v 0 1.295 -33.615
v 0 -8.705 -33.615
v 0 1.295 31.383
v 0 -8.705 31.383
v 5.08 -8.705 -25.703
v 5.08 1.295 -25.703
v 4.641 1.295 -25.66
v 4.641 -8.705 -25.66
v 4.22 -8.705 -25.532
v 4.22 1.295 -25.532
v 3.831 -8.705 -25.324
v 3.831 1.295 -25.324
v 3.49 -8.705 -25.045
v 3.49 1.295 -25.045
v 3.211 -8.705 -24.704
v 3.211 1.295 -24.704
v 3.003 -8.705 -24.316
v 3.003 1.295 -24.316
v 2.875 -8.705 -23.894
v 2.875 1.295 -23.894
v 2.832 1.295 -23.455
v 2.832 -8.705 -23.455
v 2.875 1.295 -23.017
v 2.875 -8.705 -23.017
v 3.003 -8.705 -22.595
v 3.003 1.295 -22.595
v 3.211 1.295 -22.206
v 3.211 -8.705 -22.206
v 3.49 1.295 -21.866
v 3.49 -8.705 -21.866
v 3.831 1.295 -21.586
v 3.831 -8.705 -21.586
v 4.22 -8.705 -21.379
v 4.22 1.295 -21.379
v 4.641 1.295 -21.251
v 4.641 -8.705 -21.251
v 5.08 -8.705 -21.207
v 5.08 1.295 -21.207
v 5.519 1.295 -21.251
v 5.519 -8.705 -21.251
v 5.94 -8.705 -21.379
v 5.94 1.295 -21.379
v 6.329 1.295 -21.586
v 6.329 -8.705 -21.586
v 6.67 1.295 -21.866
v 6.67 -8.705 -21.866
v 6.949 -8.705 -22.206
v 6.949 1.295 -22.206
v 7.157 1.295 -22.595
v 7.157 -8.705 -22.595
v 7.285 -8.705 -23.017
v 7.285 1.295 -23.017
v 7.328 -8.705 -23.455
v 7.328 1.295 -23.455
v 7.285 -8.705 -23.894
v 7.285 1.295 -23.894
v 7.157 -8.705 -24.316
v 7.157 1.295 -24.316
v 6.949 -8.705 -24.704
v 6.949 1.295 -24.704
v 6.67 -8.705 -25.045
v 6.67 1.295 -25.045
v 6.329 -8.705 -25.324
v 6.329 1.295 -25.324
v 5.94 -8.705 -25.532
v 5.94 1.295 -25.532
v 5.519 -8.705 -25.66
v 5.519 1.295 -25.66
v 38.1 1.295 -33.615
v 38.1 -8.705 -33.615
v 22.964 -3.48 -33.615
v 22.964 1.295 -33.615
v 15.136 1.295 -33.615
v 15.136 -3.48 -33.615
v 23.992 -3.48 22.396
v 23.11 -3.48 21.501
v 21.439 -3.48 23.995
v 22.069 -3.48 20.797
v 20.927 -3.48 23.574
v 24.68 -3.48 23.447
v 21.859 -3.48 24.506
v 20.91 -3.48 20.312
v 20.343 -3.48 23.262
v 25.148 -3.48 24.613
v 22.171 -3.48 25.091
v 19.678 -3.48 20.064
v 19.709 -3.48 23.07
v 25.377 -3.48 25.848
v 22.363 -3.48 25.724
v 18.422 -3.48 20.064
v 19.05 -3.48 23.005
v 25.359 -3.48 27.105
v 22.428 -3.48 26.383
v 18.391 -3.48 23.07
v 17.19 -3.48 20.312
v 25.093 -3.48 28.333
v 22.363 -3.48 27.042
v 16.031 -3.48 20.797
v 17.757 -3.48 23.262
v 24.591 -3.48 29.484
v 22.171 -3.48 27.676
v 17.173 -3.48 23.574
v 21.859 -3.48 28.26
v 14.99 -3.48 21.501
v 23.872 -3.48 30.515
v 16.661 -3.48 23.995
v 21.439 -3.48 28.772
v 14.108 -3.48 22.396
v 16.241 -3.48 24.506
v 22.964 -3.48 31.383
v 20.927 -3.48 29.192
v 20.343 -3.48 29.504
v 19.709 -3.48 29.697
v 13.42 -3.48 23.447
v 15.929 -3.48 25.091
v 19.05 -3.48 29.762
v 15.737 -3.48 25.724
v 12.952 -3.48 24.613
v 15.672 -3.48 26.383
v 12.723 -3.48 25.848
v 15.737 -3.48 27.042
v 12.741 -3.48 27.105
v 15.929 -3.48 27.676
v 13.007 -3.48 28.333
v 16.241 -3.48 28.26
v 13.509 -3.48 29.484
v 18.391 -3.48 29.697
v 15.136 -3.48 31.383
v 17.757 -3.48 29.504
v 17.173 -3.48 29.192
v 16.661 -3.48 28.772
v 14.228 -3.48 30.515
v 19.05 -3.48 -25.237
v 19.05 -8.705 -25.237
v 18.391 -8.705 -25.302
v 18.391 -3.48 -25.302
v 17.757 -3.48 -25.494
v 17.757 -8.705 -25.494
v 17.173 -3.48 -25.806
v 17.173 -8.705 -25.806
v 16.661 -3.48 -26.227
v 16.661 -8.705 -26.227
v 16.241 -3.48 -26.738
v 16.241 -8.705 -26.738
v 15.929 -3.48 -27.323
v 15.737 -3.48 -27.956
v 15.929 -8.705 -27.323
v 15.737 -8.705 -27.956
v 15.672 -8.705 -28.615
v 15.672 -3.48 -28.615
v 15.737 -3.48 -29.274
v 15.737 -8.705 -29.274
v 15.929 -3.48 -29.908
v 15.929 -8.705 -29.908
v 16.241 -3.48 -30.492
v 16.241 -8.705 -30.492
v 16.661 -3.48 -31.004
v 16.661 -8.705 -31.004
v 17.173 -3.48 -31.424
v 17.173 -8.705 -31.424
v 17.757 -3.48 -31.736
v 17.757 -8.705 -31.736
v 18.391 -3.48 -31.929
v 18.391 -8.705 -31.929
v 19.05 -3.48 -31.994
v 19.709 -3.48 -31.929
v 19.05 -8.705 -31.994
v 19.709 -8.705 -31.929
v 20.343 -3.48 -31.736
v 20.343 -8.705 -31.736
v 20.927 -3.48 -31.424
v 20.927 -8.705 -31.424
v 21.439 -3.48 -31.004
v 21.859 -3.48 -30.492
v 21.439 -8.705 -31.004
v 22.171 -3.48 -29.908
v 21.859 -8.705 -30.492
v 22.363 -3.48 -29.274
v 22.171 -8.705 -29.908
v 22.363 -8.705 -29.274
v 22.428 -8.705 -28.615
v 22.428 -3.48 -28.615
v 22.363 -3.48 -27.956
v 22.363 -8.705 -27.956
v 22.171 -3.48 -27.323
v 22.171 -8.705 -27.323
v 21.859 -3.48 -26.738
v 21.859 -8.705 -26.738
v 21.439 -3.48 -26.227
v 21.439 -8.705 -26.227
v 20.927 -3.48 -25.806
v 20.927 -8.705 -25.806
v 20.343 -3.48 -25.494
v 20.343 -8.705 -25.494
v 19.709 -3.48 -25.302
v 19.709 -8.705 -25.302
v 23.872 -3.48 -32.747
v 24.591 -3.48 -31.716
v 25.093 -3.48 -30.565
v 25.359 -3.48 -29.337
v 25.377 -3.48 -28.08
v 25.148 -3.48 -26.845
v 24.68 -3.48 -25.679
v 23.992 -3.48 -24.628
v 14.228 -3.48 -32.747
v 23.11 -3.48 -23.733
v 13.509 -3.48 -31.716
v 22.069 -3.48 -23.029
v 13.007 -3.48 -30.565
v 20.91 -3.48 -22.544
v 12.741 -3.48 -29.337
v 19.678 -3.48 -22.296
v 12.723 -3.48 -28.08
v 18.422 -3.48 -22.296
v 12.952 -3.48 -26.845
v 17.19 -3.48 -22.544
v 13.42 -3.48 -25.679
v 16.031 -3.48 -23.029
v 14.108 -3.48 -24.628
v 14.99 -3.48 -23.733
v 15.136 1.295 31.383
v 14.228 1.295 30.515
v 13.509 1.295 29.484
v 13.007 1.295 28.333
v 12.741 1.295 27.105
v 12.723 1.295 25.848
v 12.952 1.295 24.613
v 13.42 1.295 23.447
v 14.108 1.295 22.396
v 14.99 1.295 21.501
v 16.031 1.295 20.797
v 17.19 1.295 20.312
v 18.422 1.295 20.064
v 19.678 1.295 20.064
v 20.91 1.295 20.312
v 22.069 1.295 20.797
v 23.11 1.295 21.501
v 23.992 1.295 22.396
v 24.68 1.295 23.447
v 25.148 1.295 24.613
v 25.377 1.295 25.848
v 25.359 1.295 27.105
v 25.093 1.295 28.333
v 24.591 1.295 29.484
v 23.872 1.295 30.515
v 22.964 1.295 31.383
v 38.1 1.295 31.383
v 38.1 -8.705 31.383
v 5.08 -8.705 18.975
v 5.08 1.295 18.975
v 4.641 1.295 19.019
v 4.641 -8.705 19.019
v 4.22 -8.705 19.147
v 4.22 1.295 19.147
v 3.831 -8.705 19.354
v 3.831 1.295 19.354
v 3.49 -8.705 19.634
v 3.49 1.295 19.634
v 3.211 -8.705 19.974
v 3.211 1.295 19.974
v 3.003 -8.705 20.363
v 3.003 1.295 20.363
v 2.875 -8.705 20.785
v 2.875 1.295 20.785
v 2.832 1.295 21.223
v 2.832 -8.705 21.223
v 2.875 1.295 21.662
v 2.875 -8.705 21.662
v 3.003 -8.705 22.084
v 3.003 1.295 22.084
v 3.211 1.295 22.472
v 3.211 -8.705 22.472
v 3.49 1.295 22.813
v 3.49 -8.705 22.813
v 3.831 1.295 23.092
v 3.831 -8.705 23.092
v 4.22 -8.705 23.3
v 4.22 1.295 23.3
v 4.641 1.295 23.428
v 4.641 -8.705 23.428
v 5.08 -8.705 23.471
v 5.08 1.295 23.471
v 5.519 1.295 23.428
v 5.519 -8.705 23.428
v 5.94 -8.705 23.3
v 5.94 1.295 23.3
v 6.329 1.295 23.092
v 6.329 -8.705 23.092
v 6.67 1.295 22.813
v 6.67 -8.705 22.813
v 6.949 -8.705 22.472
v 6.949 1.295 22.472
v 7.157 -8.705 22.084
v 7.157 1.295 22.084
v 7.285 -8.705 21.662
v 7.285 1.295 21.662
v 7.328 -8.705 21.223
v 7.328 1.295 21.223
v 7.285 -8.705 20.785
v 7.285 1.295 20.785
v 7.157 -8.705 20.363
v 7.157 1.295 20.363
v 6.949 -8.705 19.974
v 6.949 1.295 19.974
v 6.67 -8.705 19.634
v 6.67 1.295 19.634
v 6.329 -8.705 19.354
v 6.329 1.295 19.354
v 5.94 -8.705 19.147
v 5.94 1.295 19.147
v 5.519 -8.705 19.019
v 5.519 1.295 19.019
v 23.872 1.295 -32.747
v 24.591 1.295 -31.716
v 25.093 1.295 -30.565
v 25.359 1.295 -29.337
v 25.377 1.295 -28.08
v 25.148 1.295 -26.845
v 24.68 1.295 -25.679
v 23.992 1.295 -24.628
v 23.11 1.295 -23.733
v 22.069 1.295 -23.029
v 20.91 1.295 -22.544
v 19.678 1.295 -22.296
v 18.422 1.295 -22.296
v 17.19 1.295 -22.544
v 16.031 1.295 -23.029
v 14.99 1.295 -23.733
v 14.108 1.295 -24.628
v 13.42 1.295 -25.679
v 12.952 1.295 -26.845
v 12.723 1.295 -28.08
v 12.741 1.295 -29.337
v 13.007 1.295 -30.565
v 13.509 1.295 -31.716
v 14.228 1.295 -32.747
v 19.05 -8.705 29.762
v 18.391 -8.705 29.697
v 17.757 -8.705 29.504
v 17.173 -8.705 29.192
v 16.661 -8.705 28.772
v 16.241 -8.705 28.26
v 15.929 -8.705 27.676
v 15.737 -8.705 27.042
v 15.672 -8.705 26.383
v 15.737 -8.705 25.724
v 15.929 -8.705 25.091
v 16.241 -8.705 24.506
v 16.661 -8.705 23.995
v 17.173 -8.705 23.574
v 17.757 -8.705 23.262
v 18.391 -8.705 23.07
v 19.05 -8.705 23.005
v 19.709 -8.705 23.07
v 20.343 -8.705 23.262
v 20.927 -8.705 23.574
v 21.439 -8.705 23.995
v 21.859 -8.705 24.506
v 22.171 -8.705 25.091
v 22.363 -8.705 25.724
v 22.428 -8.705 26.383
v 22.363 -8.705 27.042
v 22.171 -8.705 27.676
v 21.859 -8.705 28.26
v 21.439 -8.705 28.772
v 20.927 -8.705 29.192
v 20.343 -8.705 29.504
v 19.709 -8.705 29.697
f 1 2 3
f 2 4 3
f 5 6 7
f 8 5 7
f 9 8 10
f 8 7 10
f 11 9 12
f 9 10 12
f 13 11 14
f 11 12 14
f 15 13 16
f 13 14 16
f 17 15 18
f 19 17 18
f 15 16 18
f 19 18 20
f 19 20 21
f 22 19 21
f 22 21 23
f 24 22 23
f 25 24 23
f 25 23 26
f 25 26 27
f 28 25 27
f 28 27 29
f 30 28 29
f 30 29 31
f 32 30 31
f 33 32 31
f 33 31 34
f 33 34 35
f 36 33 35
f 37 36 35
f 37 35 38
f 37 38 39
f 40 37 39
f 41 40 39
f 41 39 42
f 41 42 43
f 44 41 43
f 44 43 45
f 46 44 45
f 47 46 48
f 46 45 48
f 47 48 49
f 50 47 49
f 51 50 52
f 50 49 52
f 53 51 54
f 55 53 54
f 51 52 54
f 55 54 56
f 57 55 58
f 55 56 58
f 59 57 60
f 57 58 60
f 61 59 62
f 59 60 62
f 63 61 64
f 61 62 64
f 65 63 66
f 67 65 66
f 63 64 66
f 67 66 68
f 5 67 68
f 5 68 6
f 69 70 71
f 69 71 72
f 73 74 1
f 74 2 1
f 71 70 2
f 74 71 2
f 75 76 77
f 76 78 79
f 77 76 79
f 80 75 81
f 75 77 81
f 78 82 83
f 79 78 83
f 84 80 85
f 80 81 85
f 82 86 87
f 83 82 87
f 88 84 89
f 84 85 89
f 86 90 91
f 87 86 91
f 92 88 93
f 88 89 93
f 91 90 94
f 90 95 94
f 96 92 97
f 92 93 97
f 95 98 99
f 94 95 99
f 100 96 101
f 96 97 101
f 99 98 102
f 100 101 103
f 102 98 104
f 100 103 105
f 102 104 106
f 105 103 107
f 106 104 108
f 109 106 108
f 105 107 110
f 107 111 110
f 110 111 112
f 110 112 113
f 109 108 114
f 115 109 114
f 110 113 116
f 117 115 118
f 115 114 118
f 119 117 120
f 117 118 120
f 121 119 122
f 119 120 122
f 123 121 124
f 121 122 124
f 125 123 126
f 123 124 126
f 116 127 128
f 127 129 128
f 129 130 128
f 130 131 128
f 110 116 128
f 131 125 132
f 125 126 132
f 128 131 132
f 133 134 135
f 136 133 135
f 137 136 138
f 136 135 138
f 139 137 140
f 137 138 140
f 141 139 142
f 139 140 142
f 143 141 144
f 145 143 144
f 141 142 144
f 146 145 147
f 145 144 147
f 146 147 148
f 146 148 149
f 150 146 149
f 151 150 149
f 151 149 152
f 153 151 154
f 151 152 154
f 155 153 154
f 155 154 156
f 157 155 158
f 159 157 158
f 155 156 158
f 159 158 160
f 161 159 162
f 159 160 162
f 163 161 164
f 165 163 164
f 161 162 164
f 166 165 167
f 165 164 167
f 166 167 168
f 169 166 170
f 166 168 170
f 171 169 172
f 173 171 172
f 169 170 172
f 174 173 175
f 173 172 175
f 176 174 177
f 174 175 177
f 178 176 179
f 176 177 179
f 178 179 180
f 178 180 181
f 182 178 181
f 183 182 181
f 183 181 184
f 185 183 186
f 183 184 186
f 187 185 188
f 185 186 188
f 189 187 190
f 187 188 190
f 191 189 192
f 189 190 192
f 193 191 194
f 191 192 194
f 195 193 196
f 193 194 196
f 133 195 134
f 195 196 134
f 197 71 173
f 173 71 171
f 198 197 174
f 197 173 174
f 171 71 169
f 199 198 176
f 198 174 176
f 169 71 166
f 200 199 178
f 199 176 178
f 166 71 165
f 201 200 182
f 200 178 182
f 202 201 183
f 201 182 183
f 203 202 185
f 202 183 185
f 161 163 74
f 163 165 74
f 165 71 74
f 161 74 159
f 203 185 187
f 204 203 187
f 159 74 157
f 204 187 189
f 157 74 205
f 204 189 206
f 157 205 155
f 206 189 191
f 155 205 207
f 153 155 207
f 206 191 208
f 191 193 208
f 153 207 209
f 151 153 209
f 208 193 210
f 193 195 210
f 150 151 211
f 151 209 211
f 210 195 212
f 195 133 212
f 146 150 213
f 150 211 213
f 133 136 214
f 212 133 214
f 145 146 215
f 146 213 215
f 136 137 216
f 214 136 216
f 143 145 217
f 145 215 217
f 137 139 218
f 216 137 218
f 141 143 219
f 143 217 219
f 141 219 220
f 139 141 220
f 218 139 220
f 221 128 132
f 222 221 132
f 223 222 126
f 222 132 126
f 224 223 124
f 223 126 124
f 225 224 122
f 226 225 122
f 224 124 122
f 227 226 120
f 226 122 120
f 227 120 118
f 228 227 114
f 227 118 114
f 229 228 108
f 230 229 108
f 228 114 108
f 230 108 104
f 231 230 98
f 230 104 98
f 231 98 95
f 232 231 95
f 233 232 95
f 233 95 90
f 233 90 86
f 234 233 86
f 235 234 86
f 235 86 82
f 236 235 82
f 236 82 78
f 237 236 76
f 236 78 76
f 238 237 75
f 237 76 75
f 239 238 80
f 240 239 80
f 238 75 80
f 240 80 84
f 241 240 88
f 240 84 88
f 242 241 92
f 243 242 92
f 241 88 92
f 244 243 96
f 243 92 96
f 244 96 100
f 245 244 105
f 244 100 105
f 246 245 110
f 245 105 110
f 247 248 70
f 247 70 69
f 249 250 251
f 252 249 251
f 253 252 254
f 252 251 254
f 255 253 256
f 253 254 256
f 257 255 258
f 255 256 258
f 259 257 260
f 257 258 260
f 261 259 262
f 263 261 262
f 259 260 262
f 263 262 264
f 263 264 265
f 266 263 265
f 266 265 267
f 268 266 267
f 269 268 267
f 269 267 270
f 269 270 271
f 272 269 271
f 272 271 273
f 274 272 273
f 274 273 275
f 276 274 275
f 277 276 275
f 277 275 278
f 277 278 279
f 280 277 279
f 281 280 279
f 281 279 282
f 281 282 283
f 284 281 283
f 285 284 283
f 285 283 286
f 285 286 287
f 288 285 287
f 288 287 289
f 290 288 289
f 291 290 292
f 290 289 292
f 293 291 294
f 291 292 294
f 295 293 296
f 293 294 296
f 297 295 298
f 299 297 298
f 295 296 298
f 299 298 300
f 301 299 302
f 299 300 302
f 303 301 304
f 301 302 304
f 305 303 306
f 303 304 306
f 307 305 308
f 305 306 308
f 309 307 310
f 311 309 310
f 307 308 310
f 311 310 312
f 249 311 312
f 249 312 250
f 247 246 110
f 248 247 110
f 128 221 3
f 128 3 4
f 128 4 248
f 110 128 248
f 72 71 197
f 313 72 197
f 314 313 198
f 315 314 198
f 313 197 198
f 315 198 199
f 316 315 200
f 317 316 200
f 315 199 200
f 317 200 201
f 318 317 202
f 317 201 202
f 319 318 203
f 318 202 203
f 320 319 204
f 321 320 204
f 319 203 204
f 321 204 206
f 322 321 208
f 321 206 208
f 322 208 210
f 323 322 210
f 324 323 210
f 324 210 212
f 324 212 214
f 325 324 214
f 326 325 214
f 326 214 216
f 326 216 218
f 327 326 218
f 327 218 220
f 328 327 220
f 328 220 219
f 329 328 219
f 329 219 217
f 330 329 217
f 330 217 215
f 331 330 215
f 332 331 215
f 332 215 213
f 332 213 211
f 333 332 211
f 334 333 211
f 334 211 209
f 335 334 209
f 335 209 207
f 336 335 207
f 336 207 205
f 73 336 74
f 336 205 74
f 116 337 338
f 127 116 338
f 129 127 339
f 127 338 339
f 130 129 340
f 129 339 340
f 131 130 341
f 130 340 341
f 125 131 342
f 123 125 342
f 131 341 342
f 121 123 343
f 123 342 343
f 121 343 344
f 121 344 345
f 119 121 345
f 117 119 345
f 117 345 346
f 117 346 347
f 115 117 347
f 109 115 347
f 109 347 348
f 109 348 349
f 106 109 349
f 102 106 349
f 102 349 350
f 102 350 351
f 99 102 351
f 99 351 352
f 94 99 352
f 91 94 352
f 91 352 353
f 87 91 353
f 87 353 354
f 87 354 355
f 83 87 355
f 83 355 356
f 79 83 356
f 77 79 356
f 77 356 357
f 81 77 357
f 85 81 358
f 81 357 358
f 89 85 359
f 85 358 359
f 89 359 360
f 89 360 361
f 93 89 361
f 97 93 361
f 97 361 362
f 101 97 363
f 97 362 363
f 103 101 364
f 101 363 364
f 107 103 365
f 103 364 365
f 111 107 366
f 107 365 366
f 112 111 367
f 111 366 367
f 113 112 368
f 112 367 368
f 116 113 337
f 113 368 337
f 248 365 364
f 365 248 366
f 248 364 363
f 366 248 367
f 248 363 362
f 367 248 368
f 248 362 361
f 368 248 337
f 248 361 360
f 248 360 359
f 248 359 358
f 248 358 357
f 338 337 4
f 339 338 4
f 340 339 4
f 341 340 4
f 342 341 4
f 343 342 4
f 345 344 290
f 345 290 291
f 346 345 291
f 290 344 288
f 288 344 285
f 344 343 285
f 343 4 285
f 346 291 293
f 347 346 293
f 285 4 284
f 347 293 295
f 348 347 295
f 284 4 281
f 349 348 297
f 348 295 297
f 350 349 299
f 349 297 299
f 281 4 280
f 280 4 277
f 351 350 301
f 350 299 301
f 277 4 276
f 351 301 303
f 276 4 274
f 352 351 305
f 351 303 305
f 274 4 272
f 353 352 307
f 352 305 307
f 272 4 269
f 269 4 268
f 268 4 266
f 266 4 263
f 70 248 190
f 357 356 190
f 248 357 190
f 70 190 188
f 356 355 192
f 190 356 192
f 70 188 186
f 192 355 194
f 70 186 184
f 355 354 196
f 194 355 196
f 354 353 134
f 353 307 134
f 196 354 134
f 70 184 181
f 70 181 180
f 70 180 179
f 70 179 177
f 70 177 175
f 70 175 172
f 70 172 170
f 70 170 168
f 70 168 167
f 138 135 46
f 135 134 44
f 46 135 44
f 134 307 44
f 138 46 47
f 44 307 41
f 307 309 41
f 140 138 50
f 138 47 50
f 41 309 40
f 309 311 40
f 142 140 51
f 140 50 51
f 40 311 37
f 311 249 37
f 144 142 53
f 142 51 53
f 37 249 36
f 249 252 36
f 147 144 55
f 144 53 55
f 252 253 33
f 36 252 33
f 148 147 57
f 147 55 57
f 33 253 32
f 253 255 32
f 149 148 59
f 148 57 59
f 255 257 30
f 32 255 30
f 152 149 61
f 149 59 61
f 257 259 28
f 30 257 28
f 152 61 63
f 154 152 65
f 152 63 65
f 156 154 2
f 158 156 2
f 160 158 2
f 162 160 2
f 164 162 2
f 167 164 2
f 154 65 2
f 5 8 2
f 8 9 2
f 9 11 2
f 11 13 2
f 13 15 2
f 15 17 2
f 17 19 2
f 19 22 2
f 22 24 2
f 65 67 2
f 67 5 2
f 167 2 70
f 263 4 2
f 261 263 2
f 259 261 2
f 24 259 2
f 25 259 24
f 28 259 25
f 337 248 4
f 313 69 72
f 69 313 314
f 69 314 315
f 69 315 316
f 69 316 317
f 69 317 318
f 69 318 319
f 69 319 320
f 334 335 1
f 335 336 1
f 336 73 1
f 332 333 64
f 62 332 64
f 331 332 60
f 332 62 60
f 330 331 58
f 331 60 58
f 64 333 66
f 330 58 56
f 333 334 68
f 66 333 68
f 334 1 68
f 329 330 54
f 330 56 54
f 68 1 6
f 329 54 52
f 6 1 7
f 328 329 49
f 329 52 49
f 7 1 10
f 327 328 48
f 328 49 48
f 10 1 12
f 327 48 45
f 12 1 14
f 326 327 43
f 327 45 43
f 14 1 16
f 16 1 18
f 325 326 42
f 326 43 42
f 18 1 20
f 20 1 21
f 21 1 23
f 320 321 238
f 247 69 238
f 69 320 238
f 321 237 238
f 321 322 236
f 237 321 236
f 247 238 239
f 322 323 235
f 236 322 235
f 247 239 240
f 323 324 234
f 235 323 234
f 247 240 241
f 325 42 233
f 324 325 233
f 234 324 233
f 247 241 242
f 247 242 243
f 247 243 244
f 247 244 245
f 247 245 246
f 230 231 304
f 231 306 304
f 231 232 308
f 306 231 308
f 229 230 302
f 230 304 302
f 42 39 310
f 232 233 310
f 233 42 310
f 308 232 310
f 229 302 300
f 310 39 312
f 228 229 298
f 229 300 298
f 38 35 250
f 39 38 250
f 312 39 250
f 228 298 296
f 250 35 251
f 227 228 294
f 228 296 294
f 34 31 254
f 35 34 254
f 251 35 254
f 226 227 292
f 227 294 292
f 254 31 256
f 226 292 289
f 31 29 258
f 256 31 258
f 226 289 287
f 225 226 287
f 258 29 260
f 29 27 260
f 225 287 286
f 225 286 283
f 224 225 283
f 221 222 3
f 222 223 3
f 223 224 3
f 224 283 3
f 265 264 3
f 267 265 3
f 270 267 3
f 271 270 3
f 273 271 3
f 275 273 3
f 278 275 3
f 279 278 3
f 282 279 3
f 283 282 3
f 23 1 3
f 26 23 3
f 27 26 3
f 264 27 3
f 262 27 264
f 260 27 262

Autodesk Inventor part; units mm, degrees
ref_plane "YZ Plane" through (0, 0, 0) normal (1, 0, 0) x (0, 1, 0)
ref_plane "XZ Plane" through (0, 0, 0) normal (0, 1, 0) x (-1, 0, 0)
ref_plane "XY Plane" through (0, 0, 0) normal (0, 0, 1) x (1, 0, 0)
sketch "Sketch1" plane through (0, 0, 0) normal (1, 0, 0) x (0, 1, 0)
  line L0 (1.2948, 31.3833) -> (-8.7052, 31.3833)
  line L1 (-8.7052, 31.3833) -> (-8.7052, -33.6153)
  line L2 (-8.7052, -33.6153) -> (1.2948, -33.6153)
  line L3 (1.2948, -33.6153) -> (1.2948, 31.3833)
  point P0 (0, 0)
  dimension "d0" = 64.9986
  dimension "d1" = 10
extrude "Extrusion1" add sketch "Sketch1" along normal blind 38.1
sketch "Sketch2" plane through (0, 1.2948, 31.3833) normal (0, 1, 0) x (1, 0, 0)
  line L0 (38.1, 64.9986) -> (38.1, 0) projected
  line L1 (0, 0) -> (38.1, 0) projected
  line L2 (0, 64.9986) -> (38.1, 64.9986) projected
  point P0 (0, 31.3833)
  point P1 (19.05, 5)
  point P2 (19.05, 59.9986)
  dimension "d4" = 0
  dimension "d5" = 19.05
  dimension "d6" = 5
  dimension "d7" = 5
hole "Hole1" at (19.05, 1.2948, 26.3833) at (19.05, 1.2948, -28.6153) direction (0, -1, 0) diameter 6.7564 end through all counterbore diameter 12.7 counterbore depth 4.7752 clearance for "Hex Head Bolt" size "1/4" standard "Ansi Unified Screw Threads"
sketch "Sketch3" plane through (0, -8.7052, -33.6153) normal (0, -1, 0) x (1, 0, 0)
  line L0 (38.1, 64.9986) -> (38.1, 0) projected
  line L1 (0, 64.9986) -> (0, 0) projected
  line L2 (0, 64.9986) -> (38.1, 64.9986) projected
  line L3 (0, 0) -> (38.1, 0) projected
  point P0 (0, 33.6153)
  point P1 (5.08, 54.8386)
  point P2 (5.08, 10.16)
  dimension "d16" = 5.08
  dimension "d24" = 10.16
  dimension "d25" = 10.16
  dimension "d26" = 5.08
hole "Hole2" at (5.08, -8.7052, 21.2233) at (5.08, -8.7052, -23.4553) direction (0, 1, 0) diameter 4.4958 end through all clearance for "Hex Machine Screw" size "#8" standard "Ansi Unified Screw Threads"
properties part number "LidarV4MountLongPlate"
